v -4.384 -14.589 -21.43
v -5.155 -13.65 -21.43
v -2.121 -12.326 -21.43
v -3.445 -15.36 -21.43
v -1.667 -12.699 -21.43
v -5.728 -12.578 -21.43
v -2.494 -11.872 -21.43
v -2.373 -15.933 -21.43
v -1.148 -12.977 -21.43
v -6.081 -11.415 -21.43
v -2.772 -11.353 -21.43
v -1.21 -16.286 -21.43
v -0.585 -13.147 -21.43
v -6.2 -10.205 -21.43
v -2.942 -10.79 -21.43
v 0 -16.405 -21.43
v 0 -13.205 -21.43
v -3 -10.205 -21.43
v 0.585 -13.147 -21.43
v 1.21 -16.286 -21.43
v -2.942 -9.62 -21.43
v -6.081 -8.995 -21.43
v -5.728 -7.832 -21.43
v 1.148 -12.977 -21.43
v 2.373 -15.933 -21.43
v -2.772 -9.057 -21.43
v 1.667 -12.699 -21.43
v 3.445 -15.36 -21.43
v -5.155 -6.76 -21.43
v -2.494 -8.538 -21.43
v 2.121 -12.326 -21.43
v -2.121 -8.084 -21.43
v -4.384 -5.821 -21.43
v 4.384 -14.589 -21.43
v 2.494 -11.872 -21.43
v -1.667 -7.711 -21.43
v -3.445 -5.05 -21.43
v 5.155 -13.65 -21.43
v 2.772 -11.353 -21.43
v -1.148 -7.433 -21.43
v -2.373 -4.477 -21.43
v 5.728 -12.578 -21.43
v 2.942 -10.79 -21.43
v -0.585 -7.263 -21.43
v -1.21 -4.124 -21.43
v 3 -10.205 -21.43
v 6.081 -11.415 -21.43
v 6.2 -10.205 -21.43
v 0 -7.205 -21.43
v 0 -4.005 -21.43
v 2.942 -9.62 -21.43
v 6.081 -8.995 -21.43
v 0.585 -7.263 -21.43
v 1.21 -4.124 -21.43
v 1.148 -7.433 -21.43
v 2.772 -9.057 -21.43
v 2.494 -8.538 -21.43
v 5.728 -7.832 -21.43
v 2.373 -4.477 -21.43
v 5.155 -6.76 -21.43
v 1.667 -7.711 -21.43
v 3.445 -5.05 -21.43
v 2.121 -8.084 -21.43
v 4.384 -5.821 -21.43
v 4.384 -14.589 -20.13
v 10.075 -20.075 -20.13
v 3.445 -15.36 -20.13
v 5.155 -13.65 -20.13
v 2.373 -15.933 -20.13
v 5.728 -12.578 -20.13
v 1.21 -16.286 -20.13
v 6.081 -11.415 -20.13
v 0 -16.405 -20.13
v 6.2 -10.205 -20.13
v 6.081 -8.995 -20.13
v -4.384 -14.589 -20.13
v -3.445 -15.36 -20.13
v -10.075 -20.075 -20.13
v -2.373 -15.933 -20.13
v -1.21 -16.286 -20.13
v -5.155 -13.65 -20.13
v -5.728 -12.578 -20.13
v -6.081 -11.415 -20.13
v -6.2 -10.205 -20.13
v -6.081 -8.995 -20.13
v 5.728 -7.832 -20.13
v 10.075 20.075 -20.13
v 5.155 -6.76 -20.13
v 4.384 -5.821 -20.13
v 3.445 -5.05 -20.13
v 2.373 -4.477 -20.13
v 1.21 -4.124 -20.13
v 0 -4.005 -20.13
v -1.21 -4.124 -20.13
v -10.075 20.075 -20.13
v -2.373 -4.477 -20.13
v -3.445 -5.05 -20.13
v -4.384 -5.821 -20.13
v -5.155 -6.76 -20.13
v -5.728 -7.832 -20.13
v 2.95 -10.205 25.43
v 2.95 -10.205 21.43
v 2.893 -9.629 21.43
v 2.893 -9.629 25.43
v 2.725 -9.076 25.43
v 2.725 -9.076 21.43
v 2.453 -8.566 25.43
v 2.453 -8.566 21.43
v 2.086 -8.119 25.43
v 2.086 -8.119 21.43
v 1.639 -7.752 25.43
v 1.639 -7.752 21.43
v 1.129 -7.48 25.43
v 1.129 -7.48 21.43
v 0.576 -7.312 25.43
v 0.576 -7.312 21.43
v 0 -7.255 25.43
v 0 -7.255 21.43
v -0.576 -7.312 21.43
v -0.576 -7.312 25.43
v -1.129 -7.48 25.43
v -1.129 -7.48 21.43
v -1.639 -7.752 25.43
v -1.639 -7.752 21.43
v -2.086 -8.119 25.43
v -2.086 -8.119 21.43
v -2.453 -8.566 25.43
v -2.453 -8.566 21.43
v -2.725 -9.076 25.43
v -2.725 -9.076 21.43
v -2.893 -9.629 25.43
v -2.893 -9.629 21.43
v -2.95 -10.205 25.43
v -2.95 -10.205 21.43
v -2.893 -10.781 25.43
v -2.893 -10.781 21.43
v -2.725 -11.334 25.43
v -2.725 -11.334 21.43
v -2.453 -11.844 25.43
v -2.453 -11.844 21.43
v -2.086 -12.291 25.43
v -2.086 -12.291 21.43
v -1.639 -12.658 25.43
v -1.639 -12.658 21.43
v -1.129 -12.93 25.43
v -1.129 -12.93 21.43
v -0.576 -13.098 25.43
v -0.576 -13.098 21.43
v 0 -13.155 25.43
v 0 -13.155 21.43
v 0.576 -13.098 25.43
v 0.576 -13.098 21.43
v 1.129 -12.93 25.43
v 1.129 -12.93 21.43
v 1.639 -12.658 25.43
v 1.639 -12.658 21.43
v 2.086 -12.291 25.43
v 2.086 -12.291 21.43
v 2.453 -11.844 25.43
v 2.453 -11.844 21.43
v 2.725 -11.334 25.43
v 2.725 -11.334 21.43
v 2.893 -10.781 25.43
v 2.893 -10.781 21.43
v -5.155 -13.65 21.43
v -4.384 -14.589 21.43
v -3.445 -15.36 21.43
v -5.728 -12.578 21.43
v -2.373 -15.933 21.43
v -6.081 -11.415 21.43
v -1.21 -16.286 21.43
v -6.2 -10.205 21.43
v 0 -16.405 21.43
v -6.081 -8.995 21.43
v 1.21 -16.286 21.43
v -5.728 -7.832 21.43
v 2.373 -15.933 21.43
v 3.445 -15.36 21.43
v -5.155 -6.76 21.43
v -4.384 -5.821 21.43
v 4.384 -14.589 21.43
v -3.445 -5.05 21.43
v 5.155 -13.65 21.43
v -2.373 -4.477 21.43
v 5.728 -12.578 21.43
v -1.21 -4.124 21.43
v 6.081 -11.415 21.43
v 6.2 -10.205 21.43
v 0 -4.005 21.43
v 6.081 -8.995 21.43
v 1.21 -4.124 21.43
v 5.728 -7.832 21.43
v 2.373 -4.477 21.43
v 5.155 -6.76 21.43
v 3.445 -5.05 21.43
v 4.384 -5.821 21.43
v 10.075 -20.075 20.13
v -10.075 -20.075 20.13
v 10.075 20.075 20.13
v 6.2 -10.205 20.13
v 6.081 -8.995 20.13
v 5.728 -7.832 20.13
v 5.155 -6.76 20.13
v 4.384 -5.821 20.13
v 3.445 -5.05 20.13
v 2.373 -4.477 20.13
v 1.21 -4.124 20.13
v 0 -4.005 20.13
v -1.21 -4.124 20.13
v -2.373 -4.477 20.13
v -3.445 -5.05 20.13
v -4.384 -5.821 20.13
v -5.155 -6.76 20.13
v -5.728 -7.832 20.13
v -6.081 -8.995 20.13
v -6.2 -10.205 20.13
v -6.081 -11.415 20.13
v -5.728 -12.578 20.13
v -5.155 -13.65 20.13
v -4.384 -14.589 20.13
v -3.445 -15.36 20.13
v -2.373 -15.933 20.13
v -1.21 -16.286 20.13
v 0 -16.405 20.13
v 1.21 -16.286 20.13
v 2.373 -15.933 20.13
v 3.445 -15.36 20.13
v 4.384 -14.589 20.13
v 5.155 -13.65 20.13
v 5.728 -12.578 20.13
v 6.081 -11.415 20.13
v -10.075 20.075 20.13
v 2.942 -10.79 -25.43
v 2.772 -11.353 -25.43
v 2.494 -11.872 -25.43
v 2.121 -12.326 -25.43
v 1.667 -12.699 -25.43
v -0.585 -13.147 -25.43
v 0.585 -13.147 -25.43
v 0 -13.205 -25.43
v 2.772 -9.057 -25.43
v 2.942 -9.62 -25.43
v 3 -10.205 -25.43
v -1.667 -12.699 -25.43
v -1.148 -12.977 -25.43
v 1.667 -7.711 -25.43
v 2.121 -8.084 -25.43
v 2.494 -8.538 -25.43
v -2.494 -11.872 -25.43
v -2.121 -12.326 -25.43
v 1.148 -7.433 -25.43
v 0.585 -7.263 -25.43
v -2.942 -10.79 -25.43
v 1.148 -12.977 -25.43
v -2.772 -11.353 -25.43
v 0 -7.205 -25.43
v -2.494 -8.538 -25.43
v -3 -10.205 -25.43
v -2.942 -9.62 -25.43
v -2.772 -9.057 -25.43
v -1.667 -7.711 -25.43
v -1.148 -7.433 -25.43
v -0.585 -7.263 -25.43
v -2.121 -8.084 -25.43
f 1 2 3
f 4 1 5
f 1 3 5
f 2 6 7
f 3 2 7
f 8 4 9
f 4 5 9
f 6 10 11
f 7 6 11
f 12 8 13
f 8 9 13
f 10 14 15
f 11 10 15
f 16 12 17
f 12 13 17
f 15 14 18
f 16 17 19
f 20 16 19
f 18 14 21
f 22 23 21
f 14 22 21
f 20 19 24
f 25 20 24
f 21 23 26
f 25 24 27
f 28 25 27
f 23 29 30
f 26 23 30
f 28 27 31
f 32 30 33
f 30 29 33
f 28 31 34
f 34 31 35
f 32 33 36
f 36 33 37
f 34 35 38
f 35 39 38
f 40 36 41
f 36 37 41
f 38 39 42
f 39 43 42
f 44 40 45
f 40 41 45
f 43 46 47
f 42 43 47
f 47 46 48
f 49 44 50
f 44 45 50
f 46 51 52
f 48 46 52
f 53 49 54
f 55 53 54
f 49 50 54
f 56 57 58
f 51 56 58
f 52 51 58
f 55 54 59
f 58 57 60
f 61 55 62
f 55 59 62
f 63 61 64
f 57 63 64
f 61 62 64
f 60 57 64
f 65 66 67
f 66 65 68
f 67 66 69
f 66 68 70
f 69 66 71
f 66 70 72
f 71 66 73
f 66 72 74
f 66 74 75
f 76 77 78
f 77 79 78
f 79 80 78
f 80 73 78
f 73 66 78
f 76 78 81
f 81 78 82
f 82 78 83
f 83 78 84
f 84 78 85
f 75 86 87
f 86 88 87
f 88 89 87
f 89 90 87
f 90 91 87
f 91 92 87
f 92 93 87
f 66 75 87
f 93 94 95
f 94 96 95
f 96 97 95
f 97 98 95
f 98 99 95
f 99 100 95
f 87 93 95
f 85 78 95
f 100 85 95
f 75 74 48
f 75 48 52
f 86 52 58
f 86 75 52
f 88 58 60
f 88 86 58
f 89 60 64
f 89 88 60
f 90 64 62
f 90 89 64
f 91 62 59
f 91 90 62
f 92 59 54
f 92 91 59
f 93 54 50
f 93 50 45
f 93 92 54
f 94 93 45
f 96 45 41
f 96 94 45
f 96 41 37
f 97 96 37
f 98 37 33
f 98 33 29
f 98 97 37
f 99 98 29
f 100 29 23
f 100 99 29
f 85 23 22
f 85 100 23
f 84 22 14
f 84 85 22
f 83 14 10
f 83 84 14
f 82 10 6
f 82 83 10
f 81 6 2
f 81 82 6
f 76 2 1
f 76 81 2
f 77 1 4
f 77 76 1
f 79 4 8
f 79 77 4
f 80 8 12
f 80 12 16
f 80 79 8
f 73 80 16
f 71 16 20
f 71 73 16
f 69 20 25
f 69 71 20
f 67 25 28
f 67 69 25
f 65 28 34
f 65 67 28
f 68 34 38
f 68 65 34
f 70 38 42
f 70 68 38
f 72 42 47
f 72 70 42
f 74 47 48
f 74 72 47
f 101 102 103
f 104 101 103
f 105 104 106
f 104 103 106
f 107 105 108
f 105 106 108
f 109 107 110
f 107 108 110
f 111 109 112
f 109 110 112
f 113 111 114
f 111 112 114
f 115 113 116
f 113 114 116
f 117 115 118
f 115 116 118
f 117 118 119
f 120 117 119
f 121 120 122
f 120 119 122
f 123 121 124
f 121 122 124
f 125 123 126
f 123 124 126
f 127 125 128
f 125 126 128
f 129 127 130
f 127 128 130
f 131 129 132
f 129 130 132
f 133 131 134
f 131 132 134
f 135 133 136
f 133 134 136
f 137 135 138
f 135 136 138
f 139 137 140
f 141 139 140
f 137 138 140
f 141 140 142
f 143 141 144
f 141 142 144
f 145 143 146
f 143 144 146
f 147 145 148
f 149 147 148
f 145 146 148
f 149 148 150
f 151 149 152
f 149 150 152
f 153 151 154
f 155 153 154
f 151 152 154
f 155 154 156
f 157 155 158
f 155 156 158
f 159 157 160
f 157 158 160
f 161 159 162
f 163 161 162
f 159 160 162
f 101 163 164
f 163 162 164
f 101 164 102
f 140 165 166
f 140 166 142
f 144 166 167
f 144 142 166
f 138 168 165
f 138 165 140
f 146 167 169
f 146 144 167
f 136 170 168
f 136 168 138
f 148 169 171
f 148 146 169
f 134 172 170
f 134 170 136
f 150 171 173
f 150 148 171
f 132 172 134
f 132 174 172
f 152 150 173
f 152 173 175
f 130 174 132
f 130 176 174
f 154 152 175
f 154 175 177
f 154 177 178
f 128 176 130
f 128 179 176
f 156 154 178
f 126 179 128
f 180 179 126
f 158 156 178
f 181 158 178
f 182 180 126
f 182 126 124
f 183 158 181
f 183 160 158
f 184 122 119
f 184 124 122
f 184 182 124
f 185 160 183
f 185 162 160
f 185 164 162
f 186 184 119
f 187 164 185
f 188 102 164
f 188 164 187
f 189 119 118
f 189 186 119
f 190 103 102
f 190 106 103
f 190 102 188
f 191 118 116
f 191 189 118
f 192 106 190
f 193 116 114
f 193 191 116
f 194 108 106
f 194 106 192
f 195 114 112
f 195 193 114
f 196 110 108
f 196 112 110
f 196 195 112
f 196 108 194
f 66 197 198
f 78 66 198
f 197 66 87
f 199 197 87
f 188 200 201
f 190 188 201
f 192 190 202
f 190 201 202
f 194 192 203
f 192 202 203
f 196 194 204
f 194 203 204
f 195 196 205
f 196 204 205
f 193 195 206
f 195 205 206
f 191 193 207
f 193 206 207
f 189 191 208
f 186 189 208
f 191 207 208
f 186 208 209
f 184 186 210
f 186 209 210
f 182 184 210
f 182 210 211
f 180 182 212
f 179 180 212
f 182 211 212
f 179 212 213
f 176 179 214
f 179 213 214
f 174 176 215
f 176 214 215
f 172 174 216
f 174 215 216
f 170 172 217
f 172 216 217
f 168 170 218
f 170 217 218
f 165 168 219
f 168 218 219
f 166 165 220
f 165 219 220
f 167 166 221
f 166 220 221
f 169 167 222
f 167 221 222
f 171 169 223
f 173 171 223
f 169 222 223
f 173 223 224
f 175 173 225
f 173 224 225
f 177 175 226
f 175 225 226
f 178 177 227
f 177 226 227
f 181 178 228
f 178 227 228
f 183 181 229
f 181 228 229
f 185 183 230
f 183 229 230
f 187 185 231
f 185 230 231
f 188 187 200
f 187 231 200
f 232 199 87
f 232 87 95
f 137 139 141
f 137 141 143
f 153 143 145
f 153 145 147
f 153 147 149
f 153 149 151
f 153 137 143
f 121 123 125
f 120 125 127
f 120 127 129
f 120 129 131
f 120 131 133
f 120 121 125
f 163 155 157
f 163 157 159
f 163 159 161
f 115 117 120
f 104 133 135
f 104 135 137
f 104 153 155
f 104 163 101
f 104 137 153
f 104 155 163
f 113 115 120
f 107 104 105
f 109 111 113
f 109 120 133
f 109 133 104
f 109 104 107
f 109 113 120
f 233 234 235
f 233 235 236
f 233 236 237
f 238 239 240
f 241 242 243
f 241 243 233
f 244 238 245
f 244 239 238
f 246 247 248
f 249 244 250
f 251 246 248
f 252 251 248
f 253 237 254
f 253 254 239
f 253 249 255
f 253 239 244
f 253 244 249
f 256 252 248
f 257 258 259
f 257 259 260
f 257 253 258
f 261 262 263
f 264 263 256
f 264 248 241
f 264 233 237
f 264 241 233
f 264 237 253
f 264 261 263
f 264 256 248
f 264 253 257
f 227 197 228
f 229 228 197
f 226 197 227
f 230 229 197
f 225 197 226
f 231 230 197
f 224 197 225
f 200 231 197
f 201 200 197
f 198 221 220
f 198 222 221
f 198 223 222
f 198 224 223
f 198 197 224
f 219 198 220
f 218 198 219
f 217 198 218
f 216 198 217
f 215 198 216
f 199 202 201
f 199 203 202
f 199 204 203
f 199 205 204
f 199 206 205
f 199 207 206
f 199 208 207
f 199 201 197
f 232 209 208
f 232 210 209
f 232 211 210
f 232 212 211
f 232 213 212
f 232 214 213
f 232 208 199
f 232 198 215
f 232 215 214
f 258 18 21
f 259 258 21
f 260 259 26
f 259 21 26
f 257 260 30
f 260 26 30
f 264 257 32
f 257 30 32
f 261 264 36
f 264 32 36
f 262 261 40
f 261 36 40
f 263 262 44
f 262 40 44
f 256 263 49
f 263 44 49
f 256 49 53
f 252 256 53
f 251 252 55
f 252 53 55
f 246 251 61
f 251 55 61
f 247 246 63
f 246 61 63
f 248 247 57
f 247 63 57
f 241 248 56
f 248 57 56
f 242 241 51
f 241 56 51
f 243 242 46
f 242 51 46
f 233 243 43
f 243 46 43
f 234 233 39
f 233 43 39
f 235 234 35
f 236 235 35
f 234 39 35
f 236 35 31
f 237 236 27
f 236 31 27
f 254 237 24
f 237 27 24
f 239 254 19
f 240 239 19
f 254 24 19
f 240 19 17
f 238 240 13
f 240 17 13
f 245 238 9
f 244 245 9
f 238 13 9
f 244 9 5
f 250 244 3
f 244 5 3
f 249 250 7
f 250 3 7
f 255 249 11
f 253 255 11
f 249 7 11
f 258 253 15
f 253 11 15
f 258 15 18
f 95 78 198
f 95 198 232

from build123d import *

# Parameters (mm, degrees)
SKETCH1_W           = 40.15
SKETCH1_H           = 20.15
BOSS_EXTRUDE1_DEPTH = 20.13
SKETCH2_R           = 6.2
BOSS_EXTRUDE2_DEPTH = 1.3
SKETCH3_R           = 3
BOSS_EXTRUDE3_DEPTH = 4
SKETCH7_R           = 2.95
BOSS_EXTRUDE4_DEPTH = 4


with BuildPart() as part:
    # Sketch1 → Boss-Extrude1 (new, symmetric)
    with BuildSketch(Plane(origin=(0, 0, 0), x_dir=(0, 1, 0), z_dir=(0, 0, 1))):
        Rectangle(SKETCH1_W, SKETCH1_H)
    extrude(amount=BOSS_EXTRUDE1_DEPTH, both=True)

    # Sketch2 → Boss-Extrude2 (add)
    with BuildSketch(Plane.XY.offset(20.13)):
        with Locations((0, -10.205)):
            Circle(SKETCH2_R)
    boss_extrude2 = extrude(amount=BOSS_EXTRUDE2_DEPTH)

    # Mirror1: Boss-Extrude2 across plane
    add(boss_extrude2.mirror(Plane.XY))

    # Sketch3 → Boss-Extrude3 (add)
    with BuildSketch(Plane(origin=(0, 0, -21.43), x_dir=(1, 0, 0), z_dir=(0, 0, -1))):
        with Locations(Location((0, 10.205, 0), (0, 0, 180))):
            Circle(SKETCH3_R)
    extrude(amount=BOSS_EXTRUDE3_DEPTH)

    # Sketch7 → Boss-Extrude4 (add)
    with BuildSketch(Plane.XY.offset(21.43)):
        with Locations((0, -10.205)):
            Circle(SKETCH7_R)
    extrude(amount=BOSS_EXTRUDE4_DEPTH)


solid = part.part
